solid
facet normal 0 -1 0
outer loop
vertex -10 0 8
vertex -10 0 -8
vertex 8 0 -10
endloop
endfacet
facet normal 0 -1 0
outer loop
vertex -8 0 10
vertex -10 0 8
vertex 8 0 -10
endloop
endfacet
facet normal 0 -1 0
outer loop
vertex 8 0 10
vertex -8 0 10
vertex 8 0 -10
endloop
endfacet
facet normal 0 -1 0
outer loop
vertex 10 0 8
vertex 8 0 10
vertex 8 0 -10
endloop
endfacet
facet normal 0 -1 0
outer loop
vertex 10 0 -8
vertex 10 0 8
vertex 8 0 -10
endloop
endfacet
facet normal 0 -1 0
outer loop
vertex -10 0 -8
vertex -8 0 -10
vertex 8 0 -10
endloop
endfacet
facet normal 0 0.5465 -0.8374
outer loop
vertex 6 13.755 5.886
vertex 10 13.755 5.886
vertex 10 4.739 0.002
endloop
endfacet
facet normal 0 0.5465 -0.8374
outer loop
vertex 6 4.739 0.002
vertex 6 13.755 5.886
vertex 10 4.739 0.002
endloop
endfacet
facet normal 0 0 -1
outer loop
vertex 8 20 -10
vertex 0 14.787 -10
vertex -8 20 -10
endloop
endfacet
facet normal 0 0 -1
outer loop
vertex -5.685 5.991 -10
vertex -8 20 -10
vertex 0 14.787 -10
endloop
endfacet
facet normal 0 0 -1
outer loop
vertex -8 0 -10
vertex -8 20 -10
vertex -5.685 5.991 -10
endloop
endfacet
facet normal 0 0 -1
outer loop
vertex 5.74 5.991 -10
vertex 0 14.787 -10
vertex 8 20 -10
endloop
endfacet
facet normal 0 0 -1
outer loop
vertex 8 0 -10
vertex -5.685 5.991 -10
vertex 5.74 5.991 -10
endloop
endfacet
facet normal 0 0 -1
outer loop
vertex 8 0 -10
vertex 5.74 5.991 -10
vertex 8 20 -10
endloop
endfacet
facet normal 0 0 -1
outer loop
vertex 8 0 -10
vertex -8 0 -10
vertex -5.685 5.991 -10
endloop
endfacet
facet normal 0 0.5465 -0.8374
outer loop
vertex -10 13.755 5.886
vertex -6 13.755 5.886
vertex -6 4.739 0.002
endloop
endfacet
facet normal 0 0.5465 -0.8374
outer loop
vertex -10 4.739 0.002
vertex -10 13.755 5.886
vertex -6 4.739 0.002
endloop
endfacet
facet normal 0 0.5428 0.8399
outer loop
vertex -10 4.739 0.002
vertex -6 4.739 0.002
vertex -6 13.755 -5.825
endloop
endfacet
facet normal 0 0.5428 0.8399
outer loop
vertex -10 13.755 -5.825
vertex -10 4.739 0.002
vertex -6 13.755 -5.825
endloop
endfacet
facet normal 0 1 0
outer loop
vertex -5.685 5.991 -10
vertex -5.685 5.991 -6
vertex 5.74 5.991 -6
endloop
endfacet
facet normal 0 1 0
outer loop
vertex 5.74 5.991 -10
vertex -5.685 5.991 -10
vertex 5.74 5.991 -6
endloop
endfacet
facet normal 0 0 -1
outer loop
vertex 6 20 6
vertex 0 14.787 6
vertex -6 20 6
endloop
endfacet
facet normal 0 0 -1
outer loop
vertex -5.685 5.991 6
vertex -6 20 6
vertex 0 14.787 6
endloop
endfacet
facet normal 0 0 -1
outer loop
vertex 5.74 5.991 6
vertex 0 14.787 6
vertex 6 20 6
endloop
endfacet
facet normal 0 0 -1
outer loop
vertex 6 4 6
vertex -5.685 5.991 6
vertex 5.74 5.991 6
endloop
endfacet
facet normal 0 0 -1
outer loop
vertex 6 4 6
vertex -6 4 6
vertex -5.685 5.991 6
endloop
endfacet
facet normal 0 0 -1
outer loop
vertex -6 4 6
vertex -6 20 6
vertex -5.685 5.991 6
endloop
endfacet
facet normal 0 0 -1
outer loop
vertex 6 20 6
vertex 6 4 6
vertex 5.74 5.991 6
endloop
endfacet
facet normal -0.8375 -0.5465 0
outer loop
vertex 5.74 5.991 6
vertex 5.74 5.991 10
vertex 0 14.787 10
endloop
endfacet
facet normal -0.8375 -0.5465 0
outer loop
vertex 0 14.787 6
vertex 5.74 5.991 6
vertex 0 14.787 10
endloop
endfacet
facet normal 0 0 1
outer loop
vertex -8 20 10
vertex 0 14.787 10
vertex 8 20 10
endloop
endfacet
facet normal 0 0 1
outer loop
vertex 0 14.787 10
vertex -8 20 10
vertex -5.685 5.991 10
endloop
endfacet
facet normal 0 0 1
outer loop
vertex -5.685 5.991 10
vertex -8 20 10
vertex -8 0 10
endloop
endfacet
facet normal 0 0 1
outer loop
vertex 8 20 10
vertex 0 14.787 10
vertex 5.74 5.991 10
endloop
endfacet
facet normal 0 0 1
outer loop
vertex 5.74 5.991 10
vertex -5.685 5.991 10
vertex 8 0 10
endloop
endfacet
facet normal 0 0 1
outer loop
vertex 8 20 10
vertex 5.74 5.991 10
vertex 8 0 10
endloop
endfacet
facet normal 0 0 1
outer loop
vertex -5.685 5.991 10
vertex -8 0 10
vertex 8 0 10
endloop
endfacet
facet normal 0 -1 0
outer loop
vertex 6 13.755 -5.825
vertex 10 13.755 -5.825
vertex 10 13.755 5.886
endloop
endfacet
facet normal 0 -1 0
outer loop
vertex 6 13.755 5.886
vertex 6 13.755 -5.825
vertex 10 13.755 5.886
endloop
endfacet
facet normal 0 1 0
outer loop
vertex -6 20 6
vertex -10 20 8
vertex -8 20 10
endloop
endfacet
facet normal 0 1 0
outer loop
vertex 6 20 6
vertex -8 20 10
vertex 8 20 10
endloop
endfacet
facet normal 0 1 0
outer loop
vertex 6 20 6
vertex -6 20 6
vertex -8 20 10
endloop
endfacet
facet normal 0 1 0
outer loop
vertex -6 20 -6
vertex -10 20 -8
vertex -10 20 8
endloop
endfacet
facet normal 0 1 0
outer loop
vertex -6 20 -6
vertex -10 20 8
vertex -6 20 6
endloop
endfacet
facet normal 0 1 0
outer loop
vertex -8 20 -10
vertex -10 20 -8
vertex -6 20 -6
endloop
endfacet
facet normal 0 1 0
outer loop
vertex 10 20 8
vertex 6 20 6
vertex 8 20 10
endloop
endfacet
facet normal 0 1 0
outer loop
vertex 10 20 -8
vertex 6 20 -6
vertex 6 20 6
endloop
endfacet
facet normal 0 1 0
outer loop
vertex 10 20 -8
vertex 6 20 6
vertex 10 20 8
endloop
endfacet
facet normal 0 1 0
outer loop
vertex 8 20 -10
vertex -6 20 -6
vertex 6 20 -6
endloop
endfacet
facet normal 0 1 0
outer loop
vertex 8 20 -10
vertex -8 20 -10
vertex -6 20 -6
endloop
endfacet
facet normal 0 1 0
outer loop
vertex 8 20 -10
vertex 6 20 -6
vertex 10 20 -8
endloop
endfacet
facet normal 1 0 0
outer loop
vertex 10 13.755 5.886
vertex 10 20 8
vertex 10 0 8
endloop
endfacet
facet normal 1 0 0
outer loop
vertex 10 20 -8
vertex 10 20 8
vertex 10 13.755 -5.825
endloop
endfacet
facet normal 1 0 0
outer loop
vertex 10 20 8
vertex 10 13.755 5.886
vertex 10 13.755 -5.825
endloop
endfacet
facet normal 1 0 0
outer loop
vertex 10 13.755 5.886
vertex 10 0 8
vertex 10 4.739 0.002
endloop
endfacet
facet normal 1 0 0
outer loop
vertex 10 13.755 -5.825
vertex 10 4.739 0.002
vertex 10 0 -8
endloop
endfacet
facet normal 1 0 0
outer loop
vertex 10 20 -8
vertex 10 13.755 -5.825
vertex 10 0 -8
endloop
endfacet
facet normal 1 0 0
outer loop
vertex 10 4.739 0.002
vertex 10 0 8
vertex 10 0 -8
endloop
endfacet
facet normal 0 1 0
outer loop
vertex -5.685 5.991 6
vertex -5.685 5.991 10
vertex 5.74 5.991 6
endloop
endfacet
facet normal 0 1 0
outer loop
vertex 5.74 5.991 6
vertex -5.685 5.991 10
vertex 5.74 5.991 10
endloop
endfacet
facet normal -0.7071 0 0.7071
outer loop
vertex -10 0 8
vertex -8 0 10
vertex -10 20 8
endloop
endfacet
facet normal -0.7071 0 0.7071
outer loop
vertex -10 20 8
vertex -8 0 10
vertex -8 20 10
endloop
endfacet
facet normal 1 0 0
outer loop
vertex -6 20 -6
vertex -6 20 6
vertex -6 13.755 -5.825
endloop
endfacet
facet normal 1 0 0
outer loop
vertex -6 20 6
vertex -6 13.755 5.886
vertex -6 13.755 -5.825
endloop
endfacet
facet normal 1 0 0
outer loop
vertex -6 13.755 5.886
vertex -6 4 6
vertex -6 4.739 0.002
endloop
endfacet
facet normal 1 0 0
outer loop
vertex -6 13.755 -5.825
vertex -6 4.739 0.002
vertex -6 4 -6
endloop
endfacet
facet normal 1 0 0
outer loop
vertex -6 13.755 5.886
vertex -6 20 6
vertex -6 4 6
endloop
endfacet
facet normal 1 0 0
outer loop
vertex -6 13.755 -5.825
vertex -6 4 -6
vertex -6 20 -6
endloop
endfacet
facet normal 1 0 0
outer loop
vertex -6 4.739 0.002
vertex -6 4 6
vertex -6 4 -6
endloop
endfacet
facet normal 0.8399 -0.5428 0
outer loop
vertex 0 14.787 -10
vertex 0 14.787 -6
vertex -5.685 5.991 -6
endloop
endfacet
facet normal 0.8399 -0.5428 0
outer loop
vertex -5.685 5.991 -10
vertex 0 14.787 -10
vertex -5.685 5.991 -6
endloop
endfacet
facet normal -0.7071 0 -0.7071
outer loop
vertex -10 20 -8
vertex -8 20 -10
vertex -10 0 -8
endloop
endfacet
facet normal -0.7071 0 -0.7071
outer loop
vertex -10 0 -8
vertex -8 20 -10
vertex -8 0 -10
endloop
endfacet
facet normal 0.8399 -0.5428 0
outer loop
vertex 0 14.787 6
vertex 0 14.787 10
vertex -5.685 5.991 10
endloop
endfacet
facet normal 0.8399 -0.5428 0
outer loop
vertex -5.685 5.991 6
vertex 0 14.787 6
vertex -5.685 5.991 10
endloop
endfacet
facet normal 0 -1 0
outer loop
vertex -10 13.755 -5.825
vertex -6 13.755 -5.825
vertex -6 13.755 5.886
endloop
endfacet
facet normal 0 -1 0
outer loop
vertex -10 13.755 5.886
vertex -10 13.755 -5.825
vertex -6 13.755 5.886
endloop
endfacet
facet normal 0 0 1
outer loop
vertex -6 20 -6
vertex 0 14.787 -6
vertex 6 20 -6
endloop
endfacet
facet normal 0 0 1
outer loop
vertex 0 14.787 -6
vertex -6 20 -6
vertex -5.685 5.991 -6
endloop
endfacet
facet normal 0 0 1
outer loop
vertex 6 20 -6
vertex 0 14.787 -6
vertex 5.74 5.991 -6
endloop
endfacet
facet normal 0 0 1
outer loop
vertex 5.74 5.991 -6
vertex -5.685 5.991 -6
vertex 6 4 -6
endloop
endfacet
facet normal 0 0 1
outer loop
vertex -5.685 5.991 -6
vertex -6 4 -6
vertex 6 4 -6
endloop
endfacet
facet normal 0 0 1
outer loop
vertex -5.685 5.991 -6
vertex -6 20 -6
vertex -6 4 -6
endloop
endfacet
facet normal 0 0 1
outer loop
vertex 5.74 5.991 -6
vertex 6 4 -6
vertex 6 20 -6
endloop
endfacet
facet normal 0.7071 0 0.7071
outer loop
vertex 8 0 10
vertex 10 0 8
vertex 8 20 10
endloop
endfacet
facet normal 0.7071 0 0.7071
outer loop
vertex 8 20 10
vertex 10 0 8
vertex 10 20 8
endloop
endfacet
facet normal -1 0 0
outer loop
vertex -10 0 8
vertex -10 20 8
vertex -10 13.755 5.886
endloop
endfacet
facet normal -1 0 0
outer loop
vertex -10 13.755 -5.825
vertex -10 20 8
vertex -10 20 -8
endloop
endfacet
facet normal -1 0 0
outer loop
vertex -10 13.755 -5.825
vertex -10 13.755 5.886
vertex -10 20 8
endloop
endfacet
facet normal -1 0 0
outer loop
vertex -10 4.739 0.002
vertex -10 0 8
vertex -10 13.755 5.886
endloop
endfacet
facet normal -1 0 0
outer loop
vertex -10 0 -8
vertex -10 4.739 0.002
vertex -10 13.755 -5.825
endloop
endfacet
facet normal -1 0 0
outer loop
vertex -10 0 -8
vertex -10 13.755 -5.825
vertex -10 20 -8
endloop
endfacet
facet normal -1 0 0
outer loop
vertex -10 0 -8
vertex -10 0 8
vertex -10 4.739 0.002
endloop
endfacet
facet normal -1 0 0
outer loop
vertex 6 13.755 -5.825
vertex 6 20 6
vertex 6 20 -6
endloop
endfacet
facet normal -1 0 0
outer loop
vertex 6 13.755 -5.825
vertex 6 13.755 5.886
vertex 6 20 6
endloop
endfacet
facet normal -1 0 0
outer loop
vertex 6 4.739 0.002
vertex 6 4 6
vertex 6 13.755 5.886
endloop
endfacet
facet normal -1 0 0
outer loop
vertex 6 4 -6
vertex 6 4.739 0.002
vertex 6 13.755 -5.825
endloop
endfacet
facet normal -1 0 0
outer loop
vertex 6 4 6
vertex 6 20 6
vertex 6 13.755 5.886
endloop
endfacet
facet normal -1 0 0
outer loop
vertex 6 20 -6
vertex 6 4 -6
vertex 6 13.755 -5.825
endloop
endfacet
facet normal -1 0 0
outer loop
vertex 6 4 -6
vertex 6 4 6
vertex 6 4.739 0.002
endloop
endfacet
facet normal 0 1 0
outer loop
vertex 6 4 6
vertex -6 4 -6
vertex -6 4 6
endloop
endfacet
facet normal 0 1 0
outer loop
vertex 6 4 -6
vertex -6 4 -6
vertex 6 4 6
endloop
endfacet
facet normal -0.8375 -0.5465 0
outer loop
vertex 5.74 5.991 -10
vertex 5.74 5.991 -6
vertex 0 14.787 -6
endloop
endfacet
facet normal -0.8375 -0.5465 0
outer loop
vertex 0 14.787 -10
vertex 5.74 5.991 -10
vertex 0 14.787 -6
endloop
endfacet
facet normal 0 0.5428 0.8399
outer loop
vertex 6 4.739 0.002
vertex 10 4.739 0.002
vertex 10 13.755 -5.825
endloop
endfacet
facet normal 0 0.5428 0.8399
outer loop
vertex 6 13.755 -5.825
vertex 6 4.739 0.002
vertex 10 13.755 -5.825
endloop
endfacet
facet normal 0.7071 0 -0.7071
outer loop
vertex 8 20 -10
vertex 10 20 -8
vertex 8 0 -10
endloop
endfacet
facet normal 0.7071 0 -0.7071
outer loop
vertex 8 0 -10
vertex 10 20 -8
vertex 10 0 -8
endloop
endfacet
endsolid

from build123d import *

# Parameters (mm, degrees)
ESQUISSE1_W             = 20
ESQUISSE1_H             = 20
BOSS_EXTRU_1_DEPTH      = 4
ESQUISSE4_W             = 20
ESQUISSE4_H             = 20
ESQUISSE4_W_2           = 12
ESQUISSE4_H_2           = 12
BOSS_EXTRU_2_DEPTH      = 16
ENL_V_MAT_EXTRU_2_DEPTH = 25
ENL_V_MAT_EXTRU_3_DEPTH = 25
CHANFREIN1_SIZE         = 2


with BuildPart() as part:
    # Esquisse1 → Boss.-Extru.1 (new body)
    with BuildSketch(Plane(origin=(0, 0, 0), x_dir=(1, 0, 0), z_dir=(0, 1, 0))):
        Rectangle(ESQUISSE1_W, ESQUISSE1_H)
    extrude(amount=BOSS_EXTRU_1_DEPTH)

    # Esquisse4 → Boss.-Extru.2 (add)
    with BuildSketch(Plane(origin=(0, 4, 0), x_dir=(1, 0, 0), z_dir=(0, 1, 0))):
        Rectangle(ESQUISSE4_W, ESQUISSE4_H)
        Rectangle(ESQUISSE4_W_2, ESQUISSE4_H_2, mode=Mode.SUBTRACT)
    extrude(amount=BOSS_EXTRU_2_DEPTH)

    # Esquisse5 → Enlèv. mat.-Extru.2 (cut)
    with BuildSketch(Plane.XY.offset(10)):
        Polygon((0, 14.786741301), (-5.685006524, 5.991367039), (5.739672743, 5.991367039), align=None)
    extrude(amount=-ENL_V_MAT_EXTRU_2_DEPTH, mode=Mode.SUBTRACT)

    # Esquisse6 → Enlèv. mat.-Extru.3 (cut)
    with BuildSketch(Plane(origin=(10, 0, 0), x_dir=(0, 0, -1), z_dir=(1, 0, 0))):
        Polygon((-0.002312493, 4.739245448), (5.825004197, 13.754790289), (-5.885663837, 13.754790289), align=None)
    extrude(amount=-ENL_V_MAT_EXTRU_3_DEPTH, mode=Mode.SUBTRACT)

    # Chanfrein1
    chanfrein1_edges = [part.edges().sort_by_distance(p)[0] for p in [
        (10, 10, -10),
        (10, 10, 10),
        (-10, 10, 10),
        (-10, 10, -10),
    ]]
    chamfer(chanfrein1_edges, length=CHANFREIN1_SIZE)


solid = part.part
